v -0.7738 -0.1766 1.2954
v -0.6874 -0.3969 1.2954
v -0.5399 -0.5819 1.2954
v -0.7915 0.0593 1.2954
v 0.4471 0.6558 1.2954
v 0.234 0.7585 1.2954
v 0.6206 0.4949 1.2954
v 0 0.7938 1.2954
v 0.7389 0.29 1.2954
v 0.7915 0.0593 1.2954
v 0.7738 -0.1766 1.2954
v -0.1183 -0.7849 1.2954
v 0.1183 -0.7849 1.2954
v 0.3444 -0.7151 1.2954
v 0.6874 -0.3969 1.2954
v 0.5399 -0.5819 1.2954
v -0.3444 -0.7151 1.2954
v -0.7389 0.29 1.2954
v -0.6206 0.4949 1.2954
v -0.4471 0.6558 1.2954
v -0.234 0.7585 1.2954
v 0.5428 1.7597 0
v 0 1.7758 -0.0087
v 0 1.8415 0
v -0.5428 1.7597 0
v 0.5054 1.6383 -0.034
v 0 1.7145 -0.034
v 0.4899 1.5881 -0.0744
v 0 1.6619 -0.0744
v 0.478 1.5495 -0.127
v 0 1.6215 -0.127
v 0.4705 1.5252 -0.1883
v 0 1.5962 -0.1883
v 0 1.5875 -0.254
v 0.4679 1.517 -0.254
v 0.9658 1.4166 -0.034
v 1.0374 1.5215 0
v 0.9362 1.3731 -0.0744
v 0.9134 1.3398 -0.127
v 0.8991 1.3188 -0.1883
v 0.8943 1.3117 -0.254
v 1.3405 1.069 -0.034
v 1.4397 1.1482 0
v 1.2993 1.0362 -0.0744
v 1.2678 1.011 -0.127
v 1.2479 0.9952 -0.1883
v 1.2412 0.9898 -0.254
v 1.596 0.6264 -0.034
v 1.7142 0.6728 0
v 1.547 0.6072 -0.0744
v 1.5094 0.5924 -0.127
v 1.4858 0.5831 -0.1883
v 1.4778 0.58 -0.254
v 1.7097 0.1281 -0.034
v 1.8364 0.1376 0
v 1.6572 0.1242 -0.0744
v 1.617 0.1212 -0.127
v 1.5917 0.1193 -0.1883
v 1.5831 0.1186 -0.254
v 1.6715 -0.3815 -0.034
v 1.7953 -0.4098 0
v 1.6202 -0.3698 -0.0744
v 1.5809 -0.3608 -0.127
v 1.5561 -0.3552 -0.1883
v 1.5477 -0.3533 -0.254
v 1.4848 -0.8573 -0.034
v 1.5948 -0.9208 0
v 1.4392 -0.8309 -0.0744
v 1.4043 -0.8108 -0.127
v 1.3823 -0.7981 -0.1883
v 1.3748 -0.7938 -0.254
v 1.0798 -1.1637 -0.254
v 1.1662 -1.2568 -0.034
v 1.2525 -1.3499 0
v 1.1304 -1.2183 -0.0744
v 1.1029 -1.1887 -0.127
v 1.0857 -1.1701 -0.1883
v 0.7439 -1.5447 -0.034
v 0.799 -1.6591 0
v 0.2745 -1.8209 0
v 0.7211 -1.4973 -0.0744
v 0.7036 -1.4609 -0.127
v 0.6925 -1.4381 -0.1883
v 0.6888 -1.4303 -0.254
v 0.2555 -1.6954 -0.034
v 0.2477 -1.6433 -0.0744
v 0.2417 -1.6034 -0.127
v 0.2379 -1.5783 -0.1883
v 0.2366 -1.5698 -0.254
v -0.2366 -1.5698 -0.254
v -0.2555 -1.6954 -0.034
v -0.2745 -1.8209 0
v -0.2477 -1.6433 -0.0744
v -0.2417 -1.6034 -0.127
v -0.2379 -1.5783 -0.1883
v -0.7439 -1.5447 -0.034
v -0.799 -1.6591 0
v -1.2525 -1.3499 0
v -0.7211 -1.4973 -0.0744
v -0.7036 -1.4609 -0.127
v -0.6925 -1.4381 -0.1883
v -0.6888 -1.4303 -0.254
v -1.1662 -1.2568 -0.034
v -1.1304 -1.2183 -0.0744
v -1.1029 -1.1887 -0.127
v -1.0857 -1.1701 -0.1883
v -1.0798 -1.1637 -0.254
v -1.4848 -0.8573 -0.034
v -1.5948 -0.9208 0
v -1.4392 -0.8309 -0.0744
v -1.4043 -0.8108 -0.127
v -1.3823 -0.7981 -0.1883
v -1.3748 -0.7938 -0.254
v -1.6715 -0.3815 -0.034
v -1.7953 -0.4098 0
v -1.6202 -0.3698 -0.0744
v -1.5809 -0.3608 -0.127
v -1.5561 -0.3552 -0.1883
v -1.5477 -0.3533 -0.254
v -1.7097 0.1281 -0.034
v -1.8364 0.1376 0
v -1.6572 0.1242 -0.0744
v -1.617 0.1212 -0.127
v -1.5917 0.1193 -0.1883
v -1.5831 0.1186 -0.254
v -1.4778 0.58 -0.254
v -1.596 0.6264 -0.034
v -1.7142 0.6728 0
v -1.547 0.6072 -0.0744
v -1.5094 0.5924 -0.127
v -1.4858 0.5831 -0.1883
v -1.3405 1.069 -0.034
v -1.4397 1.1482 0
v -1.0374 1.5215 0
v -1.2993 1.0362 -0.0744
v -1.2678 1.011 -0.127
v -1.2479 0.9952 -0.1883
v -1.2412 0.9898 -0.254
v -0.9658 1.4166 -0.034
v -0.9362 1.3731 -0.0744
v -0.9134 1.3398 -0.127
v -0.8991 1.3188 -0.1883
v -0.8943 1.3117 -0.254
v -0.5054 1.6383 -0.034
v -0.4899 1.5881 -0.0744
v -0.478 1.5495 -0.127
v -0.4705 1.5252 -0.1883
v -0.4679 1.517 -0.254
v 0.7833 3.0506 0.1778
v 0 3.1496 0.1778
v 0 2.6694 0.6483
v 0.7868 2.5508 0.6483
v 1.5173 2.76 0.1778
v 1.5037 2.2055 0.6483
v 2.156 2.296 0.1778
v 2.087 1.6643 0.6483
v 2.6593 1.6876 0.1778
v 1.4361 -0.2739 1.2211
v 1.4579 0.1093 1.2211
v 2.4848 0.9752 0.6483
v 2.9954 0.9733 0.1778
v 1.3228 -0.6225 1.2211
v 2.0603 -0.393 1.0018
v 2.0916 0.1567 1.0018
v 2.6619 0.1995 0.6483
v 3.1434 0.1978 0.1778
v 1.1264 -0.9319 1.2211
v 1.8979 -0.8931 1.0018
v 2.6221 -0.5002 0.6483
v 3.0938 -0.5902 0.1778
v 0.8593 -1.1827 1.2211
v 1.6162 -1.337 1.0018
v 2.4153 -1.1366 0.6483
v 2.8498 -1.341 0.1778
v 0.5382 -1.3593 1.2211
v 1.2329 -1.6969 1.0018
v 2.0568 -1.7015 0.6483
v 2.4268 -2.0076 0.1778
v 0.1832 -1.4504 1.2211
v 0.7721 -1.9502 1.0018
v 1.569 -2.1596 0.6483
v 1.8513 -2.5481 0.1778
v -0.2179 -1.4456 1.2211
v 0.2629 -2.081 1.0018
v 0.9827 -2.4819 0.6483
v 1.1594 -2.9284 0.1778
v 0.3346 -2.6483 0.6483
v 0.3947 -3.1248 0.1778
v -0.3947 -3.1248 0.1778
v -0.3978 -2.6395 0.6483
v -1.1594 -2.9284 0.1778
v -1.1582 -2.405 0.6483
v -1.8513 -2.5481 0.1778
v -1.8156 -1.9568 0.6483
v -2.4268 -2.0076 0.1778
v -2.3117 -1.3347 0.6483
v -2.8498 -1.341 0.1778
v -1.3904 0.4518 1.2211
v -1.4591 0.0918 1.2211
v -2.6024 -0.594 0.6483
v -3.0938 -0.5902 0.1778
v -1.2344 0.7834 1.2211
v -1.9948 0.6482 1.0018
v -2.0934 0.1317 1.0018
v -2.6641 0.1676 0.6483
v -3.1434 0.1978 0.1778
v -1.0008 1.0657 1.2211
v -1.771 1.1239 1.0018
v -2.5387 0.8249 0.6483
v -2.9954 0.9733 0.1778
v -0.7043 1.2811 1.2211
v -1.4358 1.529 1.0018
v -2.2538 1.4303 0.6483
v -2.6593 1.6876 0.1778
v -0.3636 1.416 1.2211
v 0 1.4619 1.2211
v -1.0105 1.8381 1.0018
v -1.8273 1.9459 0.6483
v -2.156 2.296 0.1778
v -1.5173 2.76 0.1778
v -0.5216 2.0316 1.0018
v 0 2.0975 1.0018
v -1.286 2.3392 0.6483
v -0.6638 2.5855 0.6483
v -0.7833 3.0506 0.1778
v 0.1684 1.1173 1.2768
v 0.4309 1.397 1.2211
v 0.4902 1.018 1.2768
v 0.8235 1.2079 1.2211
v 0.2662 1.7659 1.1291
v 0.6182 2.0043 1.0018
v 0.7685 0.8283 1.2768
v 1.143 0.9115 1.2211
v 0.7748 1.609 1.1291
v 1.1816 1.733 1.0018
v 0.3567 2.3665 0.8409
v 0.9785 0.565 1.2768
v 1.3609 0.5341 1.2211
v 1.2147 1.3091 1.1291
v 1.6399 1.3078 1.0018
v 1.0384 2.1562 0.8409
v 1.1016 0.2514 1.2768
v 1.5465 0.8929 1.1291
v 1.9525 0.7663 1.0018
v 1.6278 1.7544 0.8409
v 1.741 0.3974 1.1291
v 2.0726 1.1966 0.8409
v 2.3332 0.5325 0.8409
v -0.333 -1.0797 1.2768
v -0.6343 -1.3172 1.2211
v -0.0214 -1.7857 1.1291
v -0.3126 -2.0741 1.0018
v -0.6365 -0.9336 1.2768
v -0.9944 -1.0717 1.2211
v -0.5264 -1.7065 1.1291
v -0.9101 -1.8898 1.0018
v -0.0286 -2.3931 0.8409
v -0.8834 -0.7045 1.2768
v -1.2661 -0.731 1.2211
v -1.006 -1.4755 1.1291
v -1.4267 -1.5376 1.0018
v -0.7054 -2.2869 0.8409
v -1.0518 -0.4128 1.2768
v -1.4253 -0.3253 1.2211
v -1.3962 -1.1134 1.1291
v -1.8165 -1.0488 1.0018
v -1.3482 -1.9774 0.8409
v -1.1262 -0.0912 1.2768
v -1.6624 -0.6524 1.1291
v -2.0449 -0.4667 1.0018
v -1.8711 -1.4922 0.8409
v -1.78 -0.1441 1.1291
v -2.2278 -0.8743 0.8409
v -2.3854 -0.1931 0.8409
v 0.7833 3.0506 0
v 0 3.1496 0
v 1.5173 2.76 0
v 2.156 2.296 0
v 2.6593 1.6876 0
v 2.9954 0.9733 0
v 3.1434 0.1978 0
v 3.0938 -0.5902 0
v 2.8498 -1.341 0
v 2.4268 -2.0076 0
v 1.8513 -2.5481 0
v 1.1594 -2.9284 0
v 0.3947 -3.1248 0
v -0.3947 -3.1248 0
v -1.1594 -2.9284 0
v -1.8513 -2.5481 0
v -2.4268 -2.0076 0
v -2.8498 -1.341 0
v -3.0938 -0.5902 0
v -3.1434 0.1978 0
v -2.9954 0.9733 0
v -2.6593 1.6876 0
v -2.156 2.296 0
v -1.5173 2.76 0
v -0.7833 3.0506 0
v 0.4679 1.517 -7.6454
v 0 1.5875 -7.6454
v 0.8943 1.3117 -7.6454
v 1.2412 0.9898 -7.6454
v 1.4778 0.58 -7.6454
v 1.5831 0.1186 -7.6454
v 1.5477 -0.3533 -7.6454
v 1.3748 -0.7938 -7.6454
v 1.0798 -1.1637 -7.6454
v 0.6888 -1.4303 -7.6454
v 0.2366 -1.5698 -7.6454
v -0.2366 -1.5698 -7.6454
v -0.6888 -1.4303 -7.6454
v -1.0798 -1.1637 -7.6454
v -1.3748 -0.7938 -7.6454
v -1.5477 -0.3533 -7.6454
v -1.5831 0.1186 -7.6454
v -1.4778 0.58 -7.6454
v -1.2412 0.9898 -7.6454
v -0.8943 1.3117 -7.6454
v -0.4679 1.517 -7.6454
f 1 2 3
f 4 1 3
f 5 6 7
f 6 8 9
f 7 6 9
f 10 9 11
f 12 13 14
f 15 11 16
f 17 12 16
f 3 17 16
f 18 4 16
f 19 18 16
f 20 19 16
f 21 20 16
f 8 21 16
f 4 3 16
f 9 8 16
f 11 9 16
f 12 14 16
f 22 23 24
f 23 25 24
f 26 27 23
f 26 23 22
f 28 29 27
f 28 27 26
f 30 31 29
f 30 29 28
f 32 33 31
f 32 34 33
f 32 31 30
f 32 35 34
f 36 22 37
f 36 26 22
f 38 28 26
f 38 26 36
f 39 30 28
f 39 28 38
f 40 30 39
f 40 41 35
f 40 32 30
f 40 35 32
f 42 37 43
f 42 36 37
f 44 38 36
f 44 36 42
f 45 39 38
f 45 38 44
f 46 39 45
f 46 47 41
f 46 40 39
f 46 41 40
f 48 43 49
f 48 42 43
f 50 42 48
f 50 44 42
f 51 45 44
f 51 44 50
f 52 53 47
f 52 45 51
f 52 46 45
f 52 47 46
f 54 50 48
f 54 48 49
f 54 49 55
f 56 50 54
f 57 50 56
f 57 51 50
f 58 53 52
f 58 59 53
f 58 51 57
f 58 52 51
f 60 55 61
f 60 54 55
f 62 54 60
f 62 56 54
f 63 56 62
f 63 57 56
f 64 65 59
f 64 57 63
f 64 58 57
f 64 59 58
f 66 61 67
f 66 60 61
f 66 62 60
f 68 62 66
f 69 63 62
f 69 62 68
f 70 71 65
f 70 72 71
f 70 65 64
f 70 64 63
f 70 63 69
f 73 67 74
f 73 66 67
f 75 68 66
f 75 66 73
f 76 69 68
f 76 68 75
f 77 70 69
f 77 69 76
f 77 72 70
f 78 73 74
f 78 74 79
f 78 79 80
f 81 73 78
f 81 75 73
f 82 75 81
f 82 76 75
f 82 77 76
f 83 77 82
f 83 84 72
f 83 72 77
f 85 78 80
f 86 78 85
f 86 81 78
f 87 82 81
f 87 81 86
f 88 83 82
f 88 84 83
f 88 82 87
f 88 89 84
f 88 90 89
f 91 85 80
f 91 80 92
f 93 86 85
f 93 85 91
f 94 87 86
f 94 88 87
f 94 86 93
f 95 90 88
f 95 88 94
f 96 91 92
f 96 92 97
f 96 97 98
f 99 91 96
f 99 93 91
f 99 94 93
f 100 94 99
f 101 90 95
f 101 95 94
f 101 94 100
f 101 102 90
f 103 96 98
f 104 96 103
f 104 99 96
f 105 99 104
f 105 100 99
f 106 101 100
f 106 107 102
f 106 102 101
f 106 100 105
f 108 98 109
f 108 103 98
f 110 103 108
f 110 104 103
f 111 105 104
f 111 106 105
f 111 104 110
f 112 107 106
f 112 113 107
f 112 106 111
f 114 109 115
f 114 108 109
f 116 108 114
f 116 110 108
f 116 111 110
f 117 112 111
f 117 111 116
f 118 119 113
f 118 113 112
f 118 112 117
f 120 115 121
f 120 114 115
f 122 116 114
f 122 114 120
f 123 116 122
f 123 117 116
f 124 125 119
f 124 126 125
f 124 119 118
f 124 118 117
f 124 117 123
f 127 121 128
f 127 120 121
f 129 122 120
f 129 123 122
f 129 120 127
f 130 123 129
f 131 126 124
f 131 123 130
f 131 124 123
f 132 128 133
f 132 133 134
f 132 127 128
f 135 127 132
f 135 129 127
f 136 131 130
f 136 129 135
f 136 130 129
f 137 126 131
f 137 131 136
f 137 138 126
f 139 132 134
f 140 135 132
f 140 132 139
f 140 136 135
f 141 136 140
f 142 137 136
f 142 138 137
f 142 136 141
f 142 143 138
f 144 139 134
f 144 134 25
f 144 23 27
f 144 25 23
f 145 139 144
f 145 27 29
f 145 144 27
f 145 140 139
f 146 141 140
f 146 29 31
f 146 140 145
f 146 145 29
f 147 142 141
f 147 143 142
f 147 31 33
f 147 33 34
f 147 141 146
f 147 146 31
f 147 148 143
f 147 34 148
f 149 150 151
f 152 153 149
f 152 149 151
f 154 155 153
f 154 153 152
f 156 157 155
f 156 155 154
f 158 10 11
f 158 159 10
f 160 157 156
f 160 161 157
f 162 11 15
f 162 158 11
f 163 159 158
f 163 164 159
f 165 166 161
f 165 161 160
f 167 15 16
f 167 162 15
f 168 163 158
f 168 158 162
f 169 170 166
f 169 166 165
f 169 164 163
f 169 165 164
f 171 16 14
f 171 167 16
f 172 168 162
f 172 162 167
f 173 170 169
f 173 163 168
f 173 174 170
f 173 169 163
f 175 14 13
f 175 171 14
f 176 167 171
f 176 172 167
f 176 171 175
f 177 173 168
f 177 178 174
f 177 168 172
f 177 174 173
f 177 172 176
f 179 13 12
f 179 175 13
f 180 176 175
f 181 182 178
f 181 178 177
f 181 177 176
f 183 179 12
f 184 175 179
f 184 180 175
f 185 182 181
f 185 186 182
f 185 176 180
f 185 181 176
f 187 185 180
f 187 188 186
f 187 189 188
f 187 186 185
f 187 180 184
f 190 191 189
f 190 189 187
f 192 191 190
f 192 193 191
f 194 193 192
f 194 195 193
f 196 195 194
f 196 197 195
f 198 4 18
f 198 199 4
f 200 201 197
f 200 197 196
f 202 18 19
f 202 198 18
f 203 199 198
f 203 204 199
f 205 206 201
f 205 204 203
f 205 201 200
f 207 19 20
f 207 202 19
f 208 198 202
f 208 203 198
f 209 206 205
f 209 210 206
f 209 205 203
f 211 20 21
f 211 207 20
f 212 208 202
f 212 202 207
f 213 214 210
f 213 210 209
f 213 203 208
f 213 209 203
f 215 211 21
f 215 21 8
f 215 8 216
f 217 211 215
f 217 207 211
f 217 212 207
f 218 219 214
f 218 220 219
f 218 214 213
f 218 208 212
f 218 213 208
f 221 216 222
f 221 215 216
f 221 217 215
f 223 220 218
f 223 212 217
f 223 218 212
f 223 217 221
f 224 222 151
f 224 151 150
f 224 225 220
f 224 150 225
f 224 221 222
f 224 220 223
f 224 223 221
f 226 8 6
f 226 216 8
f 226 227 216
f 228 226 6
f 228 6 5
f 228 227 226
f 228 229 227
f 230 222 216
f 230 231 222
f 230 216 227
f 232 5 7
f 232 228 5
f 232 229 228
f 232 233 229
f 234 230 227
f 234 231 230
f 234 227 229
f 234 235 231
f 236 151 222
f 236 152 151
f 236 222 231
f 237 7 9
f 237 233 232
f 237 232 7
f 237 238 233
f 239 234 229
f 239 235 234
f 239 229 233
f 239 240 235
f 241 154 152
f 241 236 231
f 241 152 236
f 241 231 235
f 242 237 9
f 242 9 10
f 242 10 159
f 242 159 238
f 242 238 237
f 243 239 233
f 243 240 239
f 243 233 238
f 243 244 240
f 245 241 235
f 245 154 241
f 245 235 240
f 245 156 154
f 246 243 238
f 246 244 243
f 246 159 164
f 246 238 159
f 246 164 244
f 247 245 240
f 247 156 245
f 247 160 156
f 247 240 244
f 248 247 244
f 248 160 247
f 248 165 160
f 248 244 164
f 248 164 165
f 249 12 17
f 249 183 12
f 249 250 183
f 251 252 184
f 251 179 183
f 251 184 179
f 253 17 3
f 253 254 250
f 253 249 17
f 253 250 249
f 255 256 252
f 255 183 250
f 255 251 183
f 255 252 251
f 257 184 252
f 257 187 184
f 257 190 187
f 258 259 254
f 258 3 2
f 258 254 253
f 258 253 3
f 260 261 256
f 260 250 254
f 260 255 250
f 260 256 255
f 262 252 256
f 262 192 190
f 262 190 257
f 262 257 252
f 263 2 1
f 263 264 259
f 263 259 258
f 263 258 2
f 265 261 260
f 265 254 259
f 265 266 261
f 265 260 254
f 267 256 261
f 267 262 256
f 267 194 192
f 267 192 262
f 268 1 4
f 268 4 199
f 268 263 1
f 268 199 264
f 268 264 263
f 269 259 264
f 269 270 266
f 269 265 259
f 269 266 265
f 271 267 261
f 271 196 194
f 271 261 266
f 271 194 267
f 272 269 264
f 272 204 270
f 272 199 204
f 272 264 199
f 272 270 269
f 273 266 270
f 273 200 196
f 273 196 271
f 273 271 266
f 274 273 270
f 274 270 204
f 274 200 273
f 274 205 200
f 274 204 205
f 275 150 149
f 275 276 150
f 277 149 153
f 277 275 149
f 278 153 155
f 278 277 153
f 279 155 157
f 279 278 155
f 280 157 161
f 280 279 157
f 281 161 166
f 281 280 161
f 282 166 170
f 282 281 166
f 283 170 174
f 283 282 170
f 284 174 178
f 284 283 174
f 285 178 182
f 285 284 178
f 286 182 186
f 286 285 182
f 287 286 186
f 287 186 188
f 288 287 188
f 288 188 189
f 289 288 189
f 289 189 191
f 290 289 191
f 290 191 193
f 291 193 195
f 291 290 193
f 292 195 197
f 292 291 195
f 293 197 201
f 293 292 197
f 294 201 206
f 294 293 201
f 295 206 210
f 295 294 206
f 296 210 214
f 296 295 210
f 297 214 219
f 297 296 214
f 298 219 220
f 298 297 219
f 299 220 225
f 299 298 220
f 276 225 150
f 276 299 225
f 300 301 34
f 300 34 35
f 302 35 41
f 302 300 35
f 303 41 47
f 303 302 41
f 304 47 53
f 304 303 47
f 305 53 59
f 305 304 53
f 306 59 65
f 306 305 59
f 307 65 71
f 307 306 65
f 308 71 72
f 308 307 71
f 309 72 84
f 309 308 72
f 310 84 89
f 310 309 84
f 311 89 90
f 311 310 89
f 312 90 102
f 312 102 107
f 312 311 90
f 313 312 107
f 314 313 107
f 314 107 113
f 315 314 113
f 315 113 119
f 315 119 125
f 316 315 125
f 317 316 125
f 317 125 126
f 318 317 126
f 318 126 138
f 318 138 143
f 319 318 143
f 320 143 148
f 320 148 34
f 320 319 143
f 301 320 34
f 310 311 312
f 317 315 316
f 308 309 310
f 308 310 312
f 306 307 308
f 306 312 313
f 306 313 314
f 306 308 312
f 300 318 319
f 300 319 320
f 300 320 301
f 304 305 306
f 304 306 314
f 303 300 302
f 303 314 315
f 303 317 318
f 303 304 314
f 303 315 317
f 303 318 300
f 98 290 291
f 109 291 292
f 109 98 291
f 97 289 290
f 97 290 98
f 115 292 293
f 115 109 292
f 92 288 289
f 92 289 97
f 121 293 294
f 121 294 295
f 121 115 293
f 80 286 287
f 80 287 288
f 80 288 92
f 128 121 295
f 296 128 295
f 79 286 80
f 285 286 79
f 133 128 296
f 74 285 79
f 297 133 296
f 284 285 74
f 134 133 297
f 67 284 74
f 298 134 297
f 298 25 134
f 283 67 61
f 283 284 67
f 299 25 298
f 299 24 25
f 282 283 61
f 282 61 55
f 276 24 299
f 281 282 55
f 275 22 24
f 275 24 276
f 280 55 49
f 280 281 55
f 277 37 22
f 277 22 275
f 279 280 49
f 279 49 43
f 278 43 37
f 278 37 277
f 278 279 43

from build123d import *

# Parameters (mm, degrees)
CUT_EXTRUDE1_DEPTH      = 4.1496001
CUT_EXTRUDE1_DEPTH_BACK = 4.1496001
CUT_EXTRUDE2_DEPTH      = 4.1496001
CUT_EXTRUDE2_DEPTH_BACK = 4.1496001
FILLET2_R               = 0.254
SKETCH7_W               = 1.840958013
SKETCH7_H               = 16.135739168
CUT_EXTRUDE3_DEPTH      = 4.1496001
CUT_EXTRUDE3_DEPTH_BACK = 4.1496001


with BuildPart() as part:
    # Sketch2 → Revolve1 (revolve)
    with BuildSketch(Plane(origin=(0, 0, 0), x_dir=(0, 0, -1), z_dir=(1, 0, 0))):
        with BuildLine():
            Line((-16.5862, 0), (-16.5862, 0.79375))
            Line((-16.5862, 0.79375), (-1.2954, 0.79375))
            ThreePointArc((-1.2954, 0.79375), (-1.001833933, 2.097500262), (-0.1778, 3.1496))
            Line((-0.1778, 3.1496), (0, 3.1496))
            Line((0, 3.1496), (0, 1.5875))
            Line((0, 1.5875), (7.6454, 1.5875))
            Line((7.6454, 1.5875), (7.6454, 1.496709354))
            Line((7.6454, 1.496709354), (7.6454, 0))
            Line((7.6454, 0), (-16.5862, 0))
        make_face()
    revolve(axis=Axis((0, 0, 16.5862), (0, 0, -1)))

    # Sketch3 → Cut-Extrude1 (cut, two sides)
    with BuildSketch(Plane(origin=(0, 0, 0), x_dir=(1, 0, 0), z_dir=(0, 1, 0))) as cut_extrude1_sk:
        Polygon((0, -16.5862), (0.99695, -15.286949465), (0.99695, -17.0942), (-0.99695, -17.0942), (-0.99695, -15.286949465), align=None)
    extrude(amount=CUT_EXTRUDE1_DEPTH, mode=Mode.SUBTRACT)
    extrude(cut_extrude1_sk.sketch, amount=-CUT_EXTRUDE1_DEPTH_BACK, mode=Mode.SUBTRACT)

    # Sketch5 → Cut-Extrude2 (cut, two sides)
    with BuildSketch(Plane(origin=(0, 0, 0), x_dir=(0, 0, -1), z_dir=(1, 0, 0))) as cut_extrude2_sk:
        Polygon((-16.5862, 0), (-15.55176486, 1.11125), (-16.9037, 1.11125), (-16.9037, -1.11125), (-15.55176486, -1.11125), align=None)
    extrude(amount=CUT_EXTRUDE2_DEPTH, mode=Mode.SUBTRACT)
    extrude(cut_extrude2_sk.sketch, amount=-CUT_EXTRUDE2_DEPTH_BACK, mode=Mode.SUBTRACT)

    # Fillet2
    fillet2_edges = [part.edges().sort_by_distance(p)[0] for p in [
        (0, -1.5875, 0),
    ]]
    fillet(fillet2_edges, radius=FILLET2_R)

    # Sketch7 → Cut-Extrude3 (cut, two sides)
    with BuildSketch(Plane(origin=(0, 0, 0), x_dir=(1, 0, 0), z_dir=(0, 1, 0))) as cut_extrude3_sk:
        with Locations((0.126729007, -9.363269584)):
            Rectangle(SKETCH7_W, SKETCH7_H)
    extrude(amount=CUT_EXTRUDE3_DEPTH, mode=Mode.SUBTRACT)
    extrude(cut_extrude3_sk.sketch, amount=-CUT_EXTRUDE3_DEPTH_BACK, mode=Mode.SUBTRACT)


solid = part.part
